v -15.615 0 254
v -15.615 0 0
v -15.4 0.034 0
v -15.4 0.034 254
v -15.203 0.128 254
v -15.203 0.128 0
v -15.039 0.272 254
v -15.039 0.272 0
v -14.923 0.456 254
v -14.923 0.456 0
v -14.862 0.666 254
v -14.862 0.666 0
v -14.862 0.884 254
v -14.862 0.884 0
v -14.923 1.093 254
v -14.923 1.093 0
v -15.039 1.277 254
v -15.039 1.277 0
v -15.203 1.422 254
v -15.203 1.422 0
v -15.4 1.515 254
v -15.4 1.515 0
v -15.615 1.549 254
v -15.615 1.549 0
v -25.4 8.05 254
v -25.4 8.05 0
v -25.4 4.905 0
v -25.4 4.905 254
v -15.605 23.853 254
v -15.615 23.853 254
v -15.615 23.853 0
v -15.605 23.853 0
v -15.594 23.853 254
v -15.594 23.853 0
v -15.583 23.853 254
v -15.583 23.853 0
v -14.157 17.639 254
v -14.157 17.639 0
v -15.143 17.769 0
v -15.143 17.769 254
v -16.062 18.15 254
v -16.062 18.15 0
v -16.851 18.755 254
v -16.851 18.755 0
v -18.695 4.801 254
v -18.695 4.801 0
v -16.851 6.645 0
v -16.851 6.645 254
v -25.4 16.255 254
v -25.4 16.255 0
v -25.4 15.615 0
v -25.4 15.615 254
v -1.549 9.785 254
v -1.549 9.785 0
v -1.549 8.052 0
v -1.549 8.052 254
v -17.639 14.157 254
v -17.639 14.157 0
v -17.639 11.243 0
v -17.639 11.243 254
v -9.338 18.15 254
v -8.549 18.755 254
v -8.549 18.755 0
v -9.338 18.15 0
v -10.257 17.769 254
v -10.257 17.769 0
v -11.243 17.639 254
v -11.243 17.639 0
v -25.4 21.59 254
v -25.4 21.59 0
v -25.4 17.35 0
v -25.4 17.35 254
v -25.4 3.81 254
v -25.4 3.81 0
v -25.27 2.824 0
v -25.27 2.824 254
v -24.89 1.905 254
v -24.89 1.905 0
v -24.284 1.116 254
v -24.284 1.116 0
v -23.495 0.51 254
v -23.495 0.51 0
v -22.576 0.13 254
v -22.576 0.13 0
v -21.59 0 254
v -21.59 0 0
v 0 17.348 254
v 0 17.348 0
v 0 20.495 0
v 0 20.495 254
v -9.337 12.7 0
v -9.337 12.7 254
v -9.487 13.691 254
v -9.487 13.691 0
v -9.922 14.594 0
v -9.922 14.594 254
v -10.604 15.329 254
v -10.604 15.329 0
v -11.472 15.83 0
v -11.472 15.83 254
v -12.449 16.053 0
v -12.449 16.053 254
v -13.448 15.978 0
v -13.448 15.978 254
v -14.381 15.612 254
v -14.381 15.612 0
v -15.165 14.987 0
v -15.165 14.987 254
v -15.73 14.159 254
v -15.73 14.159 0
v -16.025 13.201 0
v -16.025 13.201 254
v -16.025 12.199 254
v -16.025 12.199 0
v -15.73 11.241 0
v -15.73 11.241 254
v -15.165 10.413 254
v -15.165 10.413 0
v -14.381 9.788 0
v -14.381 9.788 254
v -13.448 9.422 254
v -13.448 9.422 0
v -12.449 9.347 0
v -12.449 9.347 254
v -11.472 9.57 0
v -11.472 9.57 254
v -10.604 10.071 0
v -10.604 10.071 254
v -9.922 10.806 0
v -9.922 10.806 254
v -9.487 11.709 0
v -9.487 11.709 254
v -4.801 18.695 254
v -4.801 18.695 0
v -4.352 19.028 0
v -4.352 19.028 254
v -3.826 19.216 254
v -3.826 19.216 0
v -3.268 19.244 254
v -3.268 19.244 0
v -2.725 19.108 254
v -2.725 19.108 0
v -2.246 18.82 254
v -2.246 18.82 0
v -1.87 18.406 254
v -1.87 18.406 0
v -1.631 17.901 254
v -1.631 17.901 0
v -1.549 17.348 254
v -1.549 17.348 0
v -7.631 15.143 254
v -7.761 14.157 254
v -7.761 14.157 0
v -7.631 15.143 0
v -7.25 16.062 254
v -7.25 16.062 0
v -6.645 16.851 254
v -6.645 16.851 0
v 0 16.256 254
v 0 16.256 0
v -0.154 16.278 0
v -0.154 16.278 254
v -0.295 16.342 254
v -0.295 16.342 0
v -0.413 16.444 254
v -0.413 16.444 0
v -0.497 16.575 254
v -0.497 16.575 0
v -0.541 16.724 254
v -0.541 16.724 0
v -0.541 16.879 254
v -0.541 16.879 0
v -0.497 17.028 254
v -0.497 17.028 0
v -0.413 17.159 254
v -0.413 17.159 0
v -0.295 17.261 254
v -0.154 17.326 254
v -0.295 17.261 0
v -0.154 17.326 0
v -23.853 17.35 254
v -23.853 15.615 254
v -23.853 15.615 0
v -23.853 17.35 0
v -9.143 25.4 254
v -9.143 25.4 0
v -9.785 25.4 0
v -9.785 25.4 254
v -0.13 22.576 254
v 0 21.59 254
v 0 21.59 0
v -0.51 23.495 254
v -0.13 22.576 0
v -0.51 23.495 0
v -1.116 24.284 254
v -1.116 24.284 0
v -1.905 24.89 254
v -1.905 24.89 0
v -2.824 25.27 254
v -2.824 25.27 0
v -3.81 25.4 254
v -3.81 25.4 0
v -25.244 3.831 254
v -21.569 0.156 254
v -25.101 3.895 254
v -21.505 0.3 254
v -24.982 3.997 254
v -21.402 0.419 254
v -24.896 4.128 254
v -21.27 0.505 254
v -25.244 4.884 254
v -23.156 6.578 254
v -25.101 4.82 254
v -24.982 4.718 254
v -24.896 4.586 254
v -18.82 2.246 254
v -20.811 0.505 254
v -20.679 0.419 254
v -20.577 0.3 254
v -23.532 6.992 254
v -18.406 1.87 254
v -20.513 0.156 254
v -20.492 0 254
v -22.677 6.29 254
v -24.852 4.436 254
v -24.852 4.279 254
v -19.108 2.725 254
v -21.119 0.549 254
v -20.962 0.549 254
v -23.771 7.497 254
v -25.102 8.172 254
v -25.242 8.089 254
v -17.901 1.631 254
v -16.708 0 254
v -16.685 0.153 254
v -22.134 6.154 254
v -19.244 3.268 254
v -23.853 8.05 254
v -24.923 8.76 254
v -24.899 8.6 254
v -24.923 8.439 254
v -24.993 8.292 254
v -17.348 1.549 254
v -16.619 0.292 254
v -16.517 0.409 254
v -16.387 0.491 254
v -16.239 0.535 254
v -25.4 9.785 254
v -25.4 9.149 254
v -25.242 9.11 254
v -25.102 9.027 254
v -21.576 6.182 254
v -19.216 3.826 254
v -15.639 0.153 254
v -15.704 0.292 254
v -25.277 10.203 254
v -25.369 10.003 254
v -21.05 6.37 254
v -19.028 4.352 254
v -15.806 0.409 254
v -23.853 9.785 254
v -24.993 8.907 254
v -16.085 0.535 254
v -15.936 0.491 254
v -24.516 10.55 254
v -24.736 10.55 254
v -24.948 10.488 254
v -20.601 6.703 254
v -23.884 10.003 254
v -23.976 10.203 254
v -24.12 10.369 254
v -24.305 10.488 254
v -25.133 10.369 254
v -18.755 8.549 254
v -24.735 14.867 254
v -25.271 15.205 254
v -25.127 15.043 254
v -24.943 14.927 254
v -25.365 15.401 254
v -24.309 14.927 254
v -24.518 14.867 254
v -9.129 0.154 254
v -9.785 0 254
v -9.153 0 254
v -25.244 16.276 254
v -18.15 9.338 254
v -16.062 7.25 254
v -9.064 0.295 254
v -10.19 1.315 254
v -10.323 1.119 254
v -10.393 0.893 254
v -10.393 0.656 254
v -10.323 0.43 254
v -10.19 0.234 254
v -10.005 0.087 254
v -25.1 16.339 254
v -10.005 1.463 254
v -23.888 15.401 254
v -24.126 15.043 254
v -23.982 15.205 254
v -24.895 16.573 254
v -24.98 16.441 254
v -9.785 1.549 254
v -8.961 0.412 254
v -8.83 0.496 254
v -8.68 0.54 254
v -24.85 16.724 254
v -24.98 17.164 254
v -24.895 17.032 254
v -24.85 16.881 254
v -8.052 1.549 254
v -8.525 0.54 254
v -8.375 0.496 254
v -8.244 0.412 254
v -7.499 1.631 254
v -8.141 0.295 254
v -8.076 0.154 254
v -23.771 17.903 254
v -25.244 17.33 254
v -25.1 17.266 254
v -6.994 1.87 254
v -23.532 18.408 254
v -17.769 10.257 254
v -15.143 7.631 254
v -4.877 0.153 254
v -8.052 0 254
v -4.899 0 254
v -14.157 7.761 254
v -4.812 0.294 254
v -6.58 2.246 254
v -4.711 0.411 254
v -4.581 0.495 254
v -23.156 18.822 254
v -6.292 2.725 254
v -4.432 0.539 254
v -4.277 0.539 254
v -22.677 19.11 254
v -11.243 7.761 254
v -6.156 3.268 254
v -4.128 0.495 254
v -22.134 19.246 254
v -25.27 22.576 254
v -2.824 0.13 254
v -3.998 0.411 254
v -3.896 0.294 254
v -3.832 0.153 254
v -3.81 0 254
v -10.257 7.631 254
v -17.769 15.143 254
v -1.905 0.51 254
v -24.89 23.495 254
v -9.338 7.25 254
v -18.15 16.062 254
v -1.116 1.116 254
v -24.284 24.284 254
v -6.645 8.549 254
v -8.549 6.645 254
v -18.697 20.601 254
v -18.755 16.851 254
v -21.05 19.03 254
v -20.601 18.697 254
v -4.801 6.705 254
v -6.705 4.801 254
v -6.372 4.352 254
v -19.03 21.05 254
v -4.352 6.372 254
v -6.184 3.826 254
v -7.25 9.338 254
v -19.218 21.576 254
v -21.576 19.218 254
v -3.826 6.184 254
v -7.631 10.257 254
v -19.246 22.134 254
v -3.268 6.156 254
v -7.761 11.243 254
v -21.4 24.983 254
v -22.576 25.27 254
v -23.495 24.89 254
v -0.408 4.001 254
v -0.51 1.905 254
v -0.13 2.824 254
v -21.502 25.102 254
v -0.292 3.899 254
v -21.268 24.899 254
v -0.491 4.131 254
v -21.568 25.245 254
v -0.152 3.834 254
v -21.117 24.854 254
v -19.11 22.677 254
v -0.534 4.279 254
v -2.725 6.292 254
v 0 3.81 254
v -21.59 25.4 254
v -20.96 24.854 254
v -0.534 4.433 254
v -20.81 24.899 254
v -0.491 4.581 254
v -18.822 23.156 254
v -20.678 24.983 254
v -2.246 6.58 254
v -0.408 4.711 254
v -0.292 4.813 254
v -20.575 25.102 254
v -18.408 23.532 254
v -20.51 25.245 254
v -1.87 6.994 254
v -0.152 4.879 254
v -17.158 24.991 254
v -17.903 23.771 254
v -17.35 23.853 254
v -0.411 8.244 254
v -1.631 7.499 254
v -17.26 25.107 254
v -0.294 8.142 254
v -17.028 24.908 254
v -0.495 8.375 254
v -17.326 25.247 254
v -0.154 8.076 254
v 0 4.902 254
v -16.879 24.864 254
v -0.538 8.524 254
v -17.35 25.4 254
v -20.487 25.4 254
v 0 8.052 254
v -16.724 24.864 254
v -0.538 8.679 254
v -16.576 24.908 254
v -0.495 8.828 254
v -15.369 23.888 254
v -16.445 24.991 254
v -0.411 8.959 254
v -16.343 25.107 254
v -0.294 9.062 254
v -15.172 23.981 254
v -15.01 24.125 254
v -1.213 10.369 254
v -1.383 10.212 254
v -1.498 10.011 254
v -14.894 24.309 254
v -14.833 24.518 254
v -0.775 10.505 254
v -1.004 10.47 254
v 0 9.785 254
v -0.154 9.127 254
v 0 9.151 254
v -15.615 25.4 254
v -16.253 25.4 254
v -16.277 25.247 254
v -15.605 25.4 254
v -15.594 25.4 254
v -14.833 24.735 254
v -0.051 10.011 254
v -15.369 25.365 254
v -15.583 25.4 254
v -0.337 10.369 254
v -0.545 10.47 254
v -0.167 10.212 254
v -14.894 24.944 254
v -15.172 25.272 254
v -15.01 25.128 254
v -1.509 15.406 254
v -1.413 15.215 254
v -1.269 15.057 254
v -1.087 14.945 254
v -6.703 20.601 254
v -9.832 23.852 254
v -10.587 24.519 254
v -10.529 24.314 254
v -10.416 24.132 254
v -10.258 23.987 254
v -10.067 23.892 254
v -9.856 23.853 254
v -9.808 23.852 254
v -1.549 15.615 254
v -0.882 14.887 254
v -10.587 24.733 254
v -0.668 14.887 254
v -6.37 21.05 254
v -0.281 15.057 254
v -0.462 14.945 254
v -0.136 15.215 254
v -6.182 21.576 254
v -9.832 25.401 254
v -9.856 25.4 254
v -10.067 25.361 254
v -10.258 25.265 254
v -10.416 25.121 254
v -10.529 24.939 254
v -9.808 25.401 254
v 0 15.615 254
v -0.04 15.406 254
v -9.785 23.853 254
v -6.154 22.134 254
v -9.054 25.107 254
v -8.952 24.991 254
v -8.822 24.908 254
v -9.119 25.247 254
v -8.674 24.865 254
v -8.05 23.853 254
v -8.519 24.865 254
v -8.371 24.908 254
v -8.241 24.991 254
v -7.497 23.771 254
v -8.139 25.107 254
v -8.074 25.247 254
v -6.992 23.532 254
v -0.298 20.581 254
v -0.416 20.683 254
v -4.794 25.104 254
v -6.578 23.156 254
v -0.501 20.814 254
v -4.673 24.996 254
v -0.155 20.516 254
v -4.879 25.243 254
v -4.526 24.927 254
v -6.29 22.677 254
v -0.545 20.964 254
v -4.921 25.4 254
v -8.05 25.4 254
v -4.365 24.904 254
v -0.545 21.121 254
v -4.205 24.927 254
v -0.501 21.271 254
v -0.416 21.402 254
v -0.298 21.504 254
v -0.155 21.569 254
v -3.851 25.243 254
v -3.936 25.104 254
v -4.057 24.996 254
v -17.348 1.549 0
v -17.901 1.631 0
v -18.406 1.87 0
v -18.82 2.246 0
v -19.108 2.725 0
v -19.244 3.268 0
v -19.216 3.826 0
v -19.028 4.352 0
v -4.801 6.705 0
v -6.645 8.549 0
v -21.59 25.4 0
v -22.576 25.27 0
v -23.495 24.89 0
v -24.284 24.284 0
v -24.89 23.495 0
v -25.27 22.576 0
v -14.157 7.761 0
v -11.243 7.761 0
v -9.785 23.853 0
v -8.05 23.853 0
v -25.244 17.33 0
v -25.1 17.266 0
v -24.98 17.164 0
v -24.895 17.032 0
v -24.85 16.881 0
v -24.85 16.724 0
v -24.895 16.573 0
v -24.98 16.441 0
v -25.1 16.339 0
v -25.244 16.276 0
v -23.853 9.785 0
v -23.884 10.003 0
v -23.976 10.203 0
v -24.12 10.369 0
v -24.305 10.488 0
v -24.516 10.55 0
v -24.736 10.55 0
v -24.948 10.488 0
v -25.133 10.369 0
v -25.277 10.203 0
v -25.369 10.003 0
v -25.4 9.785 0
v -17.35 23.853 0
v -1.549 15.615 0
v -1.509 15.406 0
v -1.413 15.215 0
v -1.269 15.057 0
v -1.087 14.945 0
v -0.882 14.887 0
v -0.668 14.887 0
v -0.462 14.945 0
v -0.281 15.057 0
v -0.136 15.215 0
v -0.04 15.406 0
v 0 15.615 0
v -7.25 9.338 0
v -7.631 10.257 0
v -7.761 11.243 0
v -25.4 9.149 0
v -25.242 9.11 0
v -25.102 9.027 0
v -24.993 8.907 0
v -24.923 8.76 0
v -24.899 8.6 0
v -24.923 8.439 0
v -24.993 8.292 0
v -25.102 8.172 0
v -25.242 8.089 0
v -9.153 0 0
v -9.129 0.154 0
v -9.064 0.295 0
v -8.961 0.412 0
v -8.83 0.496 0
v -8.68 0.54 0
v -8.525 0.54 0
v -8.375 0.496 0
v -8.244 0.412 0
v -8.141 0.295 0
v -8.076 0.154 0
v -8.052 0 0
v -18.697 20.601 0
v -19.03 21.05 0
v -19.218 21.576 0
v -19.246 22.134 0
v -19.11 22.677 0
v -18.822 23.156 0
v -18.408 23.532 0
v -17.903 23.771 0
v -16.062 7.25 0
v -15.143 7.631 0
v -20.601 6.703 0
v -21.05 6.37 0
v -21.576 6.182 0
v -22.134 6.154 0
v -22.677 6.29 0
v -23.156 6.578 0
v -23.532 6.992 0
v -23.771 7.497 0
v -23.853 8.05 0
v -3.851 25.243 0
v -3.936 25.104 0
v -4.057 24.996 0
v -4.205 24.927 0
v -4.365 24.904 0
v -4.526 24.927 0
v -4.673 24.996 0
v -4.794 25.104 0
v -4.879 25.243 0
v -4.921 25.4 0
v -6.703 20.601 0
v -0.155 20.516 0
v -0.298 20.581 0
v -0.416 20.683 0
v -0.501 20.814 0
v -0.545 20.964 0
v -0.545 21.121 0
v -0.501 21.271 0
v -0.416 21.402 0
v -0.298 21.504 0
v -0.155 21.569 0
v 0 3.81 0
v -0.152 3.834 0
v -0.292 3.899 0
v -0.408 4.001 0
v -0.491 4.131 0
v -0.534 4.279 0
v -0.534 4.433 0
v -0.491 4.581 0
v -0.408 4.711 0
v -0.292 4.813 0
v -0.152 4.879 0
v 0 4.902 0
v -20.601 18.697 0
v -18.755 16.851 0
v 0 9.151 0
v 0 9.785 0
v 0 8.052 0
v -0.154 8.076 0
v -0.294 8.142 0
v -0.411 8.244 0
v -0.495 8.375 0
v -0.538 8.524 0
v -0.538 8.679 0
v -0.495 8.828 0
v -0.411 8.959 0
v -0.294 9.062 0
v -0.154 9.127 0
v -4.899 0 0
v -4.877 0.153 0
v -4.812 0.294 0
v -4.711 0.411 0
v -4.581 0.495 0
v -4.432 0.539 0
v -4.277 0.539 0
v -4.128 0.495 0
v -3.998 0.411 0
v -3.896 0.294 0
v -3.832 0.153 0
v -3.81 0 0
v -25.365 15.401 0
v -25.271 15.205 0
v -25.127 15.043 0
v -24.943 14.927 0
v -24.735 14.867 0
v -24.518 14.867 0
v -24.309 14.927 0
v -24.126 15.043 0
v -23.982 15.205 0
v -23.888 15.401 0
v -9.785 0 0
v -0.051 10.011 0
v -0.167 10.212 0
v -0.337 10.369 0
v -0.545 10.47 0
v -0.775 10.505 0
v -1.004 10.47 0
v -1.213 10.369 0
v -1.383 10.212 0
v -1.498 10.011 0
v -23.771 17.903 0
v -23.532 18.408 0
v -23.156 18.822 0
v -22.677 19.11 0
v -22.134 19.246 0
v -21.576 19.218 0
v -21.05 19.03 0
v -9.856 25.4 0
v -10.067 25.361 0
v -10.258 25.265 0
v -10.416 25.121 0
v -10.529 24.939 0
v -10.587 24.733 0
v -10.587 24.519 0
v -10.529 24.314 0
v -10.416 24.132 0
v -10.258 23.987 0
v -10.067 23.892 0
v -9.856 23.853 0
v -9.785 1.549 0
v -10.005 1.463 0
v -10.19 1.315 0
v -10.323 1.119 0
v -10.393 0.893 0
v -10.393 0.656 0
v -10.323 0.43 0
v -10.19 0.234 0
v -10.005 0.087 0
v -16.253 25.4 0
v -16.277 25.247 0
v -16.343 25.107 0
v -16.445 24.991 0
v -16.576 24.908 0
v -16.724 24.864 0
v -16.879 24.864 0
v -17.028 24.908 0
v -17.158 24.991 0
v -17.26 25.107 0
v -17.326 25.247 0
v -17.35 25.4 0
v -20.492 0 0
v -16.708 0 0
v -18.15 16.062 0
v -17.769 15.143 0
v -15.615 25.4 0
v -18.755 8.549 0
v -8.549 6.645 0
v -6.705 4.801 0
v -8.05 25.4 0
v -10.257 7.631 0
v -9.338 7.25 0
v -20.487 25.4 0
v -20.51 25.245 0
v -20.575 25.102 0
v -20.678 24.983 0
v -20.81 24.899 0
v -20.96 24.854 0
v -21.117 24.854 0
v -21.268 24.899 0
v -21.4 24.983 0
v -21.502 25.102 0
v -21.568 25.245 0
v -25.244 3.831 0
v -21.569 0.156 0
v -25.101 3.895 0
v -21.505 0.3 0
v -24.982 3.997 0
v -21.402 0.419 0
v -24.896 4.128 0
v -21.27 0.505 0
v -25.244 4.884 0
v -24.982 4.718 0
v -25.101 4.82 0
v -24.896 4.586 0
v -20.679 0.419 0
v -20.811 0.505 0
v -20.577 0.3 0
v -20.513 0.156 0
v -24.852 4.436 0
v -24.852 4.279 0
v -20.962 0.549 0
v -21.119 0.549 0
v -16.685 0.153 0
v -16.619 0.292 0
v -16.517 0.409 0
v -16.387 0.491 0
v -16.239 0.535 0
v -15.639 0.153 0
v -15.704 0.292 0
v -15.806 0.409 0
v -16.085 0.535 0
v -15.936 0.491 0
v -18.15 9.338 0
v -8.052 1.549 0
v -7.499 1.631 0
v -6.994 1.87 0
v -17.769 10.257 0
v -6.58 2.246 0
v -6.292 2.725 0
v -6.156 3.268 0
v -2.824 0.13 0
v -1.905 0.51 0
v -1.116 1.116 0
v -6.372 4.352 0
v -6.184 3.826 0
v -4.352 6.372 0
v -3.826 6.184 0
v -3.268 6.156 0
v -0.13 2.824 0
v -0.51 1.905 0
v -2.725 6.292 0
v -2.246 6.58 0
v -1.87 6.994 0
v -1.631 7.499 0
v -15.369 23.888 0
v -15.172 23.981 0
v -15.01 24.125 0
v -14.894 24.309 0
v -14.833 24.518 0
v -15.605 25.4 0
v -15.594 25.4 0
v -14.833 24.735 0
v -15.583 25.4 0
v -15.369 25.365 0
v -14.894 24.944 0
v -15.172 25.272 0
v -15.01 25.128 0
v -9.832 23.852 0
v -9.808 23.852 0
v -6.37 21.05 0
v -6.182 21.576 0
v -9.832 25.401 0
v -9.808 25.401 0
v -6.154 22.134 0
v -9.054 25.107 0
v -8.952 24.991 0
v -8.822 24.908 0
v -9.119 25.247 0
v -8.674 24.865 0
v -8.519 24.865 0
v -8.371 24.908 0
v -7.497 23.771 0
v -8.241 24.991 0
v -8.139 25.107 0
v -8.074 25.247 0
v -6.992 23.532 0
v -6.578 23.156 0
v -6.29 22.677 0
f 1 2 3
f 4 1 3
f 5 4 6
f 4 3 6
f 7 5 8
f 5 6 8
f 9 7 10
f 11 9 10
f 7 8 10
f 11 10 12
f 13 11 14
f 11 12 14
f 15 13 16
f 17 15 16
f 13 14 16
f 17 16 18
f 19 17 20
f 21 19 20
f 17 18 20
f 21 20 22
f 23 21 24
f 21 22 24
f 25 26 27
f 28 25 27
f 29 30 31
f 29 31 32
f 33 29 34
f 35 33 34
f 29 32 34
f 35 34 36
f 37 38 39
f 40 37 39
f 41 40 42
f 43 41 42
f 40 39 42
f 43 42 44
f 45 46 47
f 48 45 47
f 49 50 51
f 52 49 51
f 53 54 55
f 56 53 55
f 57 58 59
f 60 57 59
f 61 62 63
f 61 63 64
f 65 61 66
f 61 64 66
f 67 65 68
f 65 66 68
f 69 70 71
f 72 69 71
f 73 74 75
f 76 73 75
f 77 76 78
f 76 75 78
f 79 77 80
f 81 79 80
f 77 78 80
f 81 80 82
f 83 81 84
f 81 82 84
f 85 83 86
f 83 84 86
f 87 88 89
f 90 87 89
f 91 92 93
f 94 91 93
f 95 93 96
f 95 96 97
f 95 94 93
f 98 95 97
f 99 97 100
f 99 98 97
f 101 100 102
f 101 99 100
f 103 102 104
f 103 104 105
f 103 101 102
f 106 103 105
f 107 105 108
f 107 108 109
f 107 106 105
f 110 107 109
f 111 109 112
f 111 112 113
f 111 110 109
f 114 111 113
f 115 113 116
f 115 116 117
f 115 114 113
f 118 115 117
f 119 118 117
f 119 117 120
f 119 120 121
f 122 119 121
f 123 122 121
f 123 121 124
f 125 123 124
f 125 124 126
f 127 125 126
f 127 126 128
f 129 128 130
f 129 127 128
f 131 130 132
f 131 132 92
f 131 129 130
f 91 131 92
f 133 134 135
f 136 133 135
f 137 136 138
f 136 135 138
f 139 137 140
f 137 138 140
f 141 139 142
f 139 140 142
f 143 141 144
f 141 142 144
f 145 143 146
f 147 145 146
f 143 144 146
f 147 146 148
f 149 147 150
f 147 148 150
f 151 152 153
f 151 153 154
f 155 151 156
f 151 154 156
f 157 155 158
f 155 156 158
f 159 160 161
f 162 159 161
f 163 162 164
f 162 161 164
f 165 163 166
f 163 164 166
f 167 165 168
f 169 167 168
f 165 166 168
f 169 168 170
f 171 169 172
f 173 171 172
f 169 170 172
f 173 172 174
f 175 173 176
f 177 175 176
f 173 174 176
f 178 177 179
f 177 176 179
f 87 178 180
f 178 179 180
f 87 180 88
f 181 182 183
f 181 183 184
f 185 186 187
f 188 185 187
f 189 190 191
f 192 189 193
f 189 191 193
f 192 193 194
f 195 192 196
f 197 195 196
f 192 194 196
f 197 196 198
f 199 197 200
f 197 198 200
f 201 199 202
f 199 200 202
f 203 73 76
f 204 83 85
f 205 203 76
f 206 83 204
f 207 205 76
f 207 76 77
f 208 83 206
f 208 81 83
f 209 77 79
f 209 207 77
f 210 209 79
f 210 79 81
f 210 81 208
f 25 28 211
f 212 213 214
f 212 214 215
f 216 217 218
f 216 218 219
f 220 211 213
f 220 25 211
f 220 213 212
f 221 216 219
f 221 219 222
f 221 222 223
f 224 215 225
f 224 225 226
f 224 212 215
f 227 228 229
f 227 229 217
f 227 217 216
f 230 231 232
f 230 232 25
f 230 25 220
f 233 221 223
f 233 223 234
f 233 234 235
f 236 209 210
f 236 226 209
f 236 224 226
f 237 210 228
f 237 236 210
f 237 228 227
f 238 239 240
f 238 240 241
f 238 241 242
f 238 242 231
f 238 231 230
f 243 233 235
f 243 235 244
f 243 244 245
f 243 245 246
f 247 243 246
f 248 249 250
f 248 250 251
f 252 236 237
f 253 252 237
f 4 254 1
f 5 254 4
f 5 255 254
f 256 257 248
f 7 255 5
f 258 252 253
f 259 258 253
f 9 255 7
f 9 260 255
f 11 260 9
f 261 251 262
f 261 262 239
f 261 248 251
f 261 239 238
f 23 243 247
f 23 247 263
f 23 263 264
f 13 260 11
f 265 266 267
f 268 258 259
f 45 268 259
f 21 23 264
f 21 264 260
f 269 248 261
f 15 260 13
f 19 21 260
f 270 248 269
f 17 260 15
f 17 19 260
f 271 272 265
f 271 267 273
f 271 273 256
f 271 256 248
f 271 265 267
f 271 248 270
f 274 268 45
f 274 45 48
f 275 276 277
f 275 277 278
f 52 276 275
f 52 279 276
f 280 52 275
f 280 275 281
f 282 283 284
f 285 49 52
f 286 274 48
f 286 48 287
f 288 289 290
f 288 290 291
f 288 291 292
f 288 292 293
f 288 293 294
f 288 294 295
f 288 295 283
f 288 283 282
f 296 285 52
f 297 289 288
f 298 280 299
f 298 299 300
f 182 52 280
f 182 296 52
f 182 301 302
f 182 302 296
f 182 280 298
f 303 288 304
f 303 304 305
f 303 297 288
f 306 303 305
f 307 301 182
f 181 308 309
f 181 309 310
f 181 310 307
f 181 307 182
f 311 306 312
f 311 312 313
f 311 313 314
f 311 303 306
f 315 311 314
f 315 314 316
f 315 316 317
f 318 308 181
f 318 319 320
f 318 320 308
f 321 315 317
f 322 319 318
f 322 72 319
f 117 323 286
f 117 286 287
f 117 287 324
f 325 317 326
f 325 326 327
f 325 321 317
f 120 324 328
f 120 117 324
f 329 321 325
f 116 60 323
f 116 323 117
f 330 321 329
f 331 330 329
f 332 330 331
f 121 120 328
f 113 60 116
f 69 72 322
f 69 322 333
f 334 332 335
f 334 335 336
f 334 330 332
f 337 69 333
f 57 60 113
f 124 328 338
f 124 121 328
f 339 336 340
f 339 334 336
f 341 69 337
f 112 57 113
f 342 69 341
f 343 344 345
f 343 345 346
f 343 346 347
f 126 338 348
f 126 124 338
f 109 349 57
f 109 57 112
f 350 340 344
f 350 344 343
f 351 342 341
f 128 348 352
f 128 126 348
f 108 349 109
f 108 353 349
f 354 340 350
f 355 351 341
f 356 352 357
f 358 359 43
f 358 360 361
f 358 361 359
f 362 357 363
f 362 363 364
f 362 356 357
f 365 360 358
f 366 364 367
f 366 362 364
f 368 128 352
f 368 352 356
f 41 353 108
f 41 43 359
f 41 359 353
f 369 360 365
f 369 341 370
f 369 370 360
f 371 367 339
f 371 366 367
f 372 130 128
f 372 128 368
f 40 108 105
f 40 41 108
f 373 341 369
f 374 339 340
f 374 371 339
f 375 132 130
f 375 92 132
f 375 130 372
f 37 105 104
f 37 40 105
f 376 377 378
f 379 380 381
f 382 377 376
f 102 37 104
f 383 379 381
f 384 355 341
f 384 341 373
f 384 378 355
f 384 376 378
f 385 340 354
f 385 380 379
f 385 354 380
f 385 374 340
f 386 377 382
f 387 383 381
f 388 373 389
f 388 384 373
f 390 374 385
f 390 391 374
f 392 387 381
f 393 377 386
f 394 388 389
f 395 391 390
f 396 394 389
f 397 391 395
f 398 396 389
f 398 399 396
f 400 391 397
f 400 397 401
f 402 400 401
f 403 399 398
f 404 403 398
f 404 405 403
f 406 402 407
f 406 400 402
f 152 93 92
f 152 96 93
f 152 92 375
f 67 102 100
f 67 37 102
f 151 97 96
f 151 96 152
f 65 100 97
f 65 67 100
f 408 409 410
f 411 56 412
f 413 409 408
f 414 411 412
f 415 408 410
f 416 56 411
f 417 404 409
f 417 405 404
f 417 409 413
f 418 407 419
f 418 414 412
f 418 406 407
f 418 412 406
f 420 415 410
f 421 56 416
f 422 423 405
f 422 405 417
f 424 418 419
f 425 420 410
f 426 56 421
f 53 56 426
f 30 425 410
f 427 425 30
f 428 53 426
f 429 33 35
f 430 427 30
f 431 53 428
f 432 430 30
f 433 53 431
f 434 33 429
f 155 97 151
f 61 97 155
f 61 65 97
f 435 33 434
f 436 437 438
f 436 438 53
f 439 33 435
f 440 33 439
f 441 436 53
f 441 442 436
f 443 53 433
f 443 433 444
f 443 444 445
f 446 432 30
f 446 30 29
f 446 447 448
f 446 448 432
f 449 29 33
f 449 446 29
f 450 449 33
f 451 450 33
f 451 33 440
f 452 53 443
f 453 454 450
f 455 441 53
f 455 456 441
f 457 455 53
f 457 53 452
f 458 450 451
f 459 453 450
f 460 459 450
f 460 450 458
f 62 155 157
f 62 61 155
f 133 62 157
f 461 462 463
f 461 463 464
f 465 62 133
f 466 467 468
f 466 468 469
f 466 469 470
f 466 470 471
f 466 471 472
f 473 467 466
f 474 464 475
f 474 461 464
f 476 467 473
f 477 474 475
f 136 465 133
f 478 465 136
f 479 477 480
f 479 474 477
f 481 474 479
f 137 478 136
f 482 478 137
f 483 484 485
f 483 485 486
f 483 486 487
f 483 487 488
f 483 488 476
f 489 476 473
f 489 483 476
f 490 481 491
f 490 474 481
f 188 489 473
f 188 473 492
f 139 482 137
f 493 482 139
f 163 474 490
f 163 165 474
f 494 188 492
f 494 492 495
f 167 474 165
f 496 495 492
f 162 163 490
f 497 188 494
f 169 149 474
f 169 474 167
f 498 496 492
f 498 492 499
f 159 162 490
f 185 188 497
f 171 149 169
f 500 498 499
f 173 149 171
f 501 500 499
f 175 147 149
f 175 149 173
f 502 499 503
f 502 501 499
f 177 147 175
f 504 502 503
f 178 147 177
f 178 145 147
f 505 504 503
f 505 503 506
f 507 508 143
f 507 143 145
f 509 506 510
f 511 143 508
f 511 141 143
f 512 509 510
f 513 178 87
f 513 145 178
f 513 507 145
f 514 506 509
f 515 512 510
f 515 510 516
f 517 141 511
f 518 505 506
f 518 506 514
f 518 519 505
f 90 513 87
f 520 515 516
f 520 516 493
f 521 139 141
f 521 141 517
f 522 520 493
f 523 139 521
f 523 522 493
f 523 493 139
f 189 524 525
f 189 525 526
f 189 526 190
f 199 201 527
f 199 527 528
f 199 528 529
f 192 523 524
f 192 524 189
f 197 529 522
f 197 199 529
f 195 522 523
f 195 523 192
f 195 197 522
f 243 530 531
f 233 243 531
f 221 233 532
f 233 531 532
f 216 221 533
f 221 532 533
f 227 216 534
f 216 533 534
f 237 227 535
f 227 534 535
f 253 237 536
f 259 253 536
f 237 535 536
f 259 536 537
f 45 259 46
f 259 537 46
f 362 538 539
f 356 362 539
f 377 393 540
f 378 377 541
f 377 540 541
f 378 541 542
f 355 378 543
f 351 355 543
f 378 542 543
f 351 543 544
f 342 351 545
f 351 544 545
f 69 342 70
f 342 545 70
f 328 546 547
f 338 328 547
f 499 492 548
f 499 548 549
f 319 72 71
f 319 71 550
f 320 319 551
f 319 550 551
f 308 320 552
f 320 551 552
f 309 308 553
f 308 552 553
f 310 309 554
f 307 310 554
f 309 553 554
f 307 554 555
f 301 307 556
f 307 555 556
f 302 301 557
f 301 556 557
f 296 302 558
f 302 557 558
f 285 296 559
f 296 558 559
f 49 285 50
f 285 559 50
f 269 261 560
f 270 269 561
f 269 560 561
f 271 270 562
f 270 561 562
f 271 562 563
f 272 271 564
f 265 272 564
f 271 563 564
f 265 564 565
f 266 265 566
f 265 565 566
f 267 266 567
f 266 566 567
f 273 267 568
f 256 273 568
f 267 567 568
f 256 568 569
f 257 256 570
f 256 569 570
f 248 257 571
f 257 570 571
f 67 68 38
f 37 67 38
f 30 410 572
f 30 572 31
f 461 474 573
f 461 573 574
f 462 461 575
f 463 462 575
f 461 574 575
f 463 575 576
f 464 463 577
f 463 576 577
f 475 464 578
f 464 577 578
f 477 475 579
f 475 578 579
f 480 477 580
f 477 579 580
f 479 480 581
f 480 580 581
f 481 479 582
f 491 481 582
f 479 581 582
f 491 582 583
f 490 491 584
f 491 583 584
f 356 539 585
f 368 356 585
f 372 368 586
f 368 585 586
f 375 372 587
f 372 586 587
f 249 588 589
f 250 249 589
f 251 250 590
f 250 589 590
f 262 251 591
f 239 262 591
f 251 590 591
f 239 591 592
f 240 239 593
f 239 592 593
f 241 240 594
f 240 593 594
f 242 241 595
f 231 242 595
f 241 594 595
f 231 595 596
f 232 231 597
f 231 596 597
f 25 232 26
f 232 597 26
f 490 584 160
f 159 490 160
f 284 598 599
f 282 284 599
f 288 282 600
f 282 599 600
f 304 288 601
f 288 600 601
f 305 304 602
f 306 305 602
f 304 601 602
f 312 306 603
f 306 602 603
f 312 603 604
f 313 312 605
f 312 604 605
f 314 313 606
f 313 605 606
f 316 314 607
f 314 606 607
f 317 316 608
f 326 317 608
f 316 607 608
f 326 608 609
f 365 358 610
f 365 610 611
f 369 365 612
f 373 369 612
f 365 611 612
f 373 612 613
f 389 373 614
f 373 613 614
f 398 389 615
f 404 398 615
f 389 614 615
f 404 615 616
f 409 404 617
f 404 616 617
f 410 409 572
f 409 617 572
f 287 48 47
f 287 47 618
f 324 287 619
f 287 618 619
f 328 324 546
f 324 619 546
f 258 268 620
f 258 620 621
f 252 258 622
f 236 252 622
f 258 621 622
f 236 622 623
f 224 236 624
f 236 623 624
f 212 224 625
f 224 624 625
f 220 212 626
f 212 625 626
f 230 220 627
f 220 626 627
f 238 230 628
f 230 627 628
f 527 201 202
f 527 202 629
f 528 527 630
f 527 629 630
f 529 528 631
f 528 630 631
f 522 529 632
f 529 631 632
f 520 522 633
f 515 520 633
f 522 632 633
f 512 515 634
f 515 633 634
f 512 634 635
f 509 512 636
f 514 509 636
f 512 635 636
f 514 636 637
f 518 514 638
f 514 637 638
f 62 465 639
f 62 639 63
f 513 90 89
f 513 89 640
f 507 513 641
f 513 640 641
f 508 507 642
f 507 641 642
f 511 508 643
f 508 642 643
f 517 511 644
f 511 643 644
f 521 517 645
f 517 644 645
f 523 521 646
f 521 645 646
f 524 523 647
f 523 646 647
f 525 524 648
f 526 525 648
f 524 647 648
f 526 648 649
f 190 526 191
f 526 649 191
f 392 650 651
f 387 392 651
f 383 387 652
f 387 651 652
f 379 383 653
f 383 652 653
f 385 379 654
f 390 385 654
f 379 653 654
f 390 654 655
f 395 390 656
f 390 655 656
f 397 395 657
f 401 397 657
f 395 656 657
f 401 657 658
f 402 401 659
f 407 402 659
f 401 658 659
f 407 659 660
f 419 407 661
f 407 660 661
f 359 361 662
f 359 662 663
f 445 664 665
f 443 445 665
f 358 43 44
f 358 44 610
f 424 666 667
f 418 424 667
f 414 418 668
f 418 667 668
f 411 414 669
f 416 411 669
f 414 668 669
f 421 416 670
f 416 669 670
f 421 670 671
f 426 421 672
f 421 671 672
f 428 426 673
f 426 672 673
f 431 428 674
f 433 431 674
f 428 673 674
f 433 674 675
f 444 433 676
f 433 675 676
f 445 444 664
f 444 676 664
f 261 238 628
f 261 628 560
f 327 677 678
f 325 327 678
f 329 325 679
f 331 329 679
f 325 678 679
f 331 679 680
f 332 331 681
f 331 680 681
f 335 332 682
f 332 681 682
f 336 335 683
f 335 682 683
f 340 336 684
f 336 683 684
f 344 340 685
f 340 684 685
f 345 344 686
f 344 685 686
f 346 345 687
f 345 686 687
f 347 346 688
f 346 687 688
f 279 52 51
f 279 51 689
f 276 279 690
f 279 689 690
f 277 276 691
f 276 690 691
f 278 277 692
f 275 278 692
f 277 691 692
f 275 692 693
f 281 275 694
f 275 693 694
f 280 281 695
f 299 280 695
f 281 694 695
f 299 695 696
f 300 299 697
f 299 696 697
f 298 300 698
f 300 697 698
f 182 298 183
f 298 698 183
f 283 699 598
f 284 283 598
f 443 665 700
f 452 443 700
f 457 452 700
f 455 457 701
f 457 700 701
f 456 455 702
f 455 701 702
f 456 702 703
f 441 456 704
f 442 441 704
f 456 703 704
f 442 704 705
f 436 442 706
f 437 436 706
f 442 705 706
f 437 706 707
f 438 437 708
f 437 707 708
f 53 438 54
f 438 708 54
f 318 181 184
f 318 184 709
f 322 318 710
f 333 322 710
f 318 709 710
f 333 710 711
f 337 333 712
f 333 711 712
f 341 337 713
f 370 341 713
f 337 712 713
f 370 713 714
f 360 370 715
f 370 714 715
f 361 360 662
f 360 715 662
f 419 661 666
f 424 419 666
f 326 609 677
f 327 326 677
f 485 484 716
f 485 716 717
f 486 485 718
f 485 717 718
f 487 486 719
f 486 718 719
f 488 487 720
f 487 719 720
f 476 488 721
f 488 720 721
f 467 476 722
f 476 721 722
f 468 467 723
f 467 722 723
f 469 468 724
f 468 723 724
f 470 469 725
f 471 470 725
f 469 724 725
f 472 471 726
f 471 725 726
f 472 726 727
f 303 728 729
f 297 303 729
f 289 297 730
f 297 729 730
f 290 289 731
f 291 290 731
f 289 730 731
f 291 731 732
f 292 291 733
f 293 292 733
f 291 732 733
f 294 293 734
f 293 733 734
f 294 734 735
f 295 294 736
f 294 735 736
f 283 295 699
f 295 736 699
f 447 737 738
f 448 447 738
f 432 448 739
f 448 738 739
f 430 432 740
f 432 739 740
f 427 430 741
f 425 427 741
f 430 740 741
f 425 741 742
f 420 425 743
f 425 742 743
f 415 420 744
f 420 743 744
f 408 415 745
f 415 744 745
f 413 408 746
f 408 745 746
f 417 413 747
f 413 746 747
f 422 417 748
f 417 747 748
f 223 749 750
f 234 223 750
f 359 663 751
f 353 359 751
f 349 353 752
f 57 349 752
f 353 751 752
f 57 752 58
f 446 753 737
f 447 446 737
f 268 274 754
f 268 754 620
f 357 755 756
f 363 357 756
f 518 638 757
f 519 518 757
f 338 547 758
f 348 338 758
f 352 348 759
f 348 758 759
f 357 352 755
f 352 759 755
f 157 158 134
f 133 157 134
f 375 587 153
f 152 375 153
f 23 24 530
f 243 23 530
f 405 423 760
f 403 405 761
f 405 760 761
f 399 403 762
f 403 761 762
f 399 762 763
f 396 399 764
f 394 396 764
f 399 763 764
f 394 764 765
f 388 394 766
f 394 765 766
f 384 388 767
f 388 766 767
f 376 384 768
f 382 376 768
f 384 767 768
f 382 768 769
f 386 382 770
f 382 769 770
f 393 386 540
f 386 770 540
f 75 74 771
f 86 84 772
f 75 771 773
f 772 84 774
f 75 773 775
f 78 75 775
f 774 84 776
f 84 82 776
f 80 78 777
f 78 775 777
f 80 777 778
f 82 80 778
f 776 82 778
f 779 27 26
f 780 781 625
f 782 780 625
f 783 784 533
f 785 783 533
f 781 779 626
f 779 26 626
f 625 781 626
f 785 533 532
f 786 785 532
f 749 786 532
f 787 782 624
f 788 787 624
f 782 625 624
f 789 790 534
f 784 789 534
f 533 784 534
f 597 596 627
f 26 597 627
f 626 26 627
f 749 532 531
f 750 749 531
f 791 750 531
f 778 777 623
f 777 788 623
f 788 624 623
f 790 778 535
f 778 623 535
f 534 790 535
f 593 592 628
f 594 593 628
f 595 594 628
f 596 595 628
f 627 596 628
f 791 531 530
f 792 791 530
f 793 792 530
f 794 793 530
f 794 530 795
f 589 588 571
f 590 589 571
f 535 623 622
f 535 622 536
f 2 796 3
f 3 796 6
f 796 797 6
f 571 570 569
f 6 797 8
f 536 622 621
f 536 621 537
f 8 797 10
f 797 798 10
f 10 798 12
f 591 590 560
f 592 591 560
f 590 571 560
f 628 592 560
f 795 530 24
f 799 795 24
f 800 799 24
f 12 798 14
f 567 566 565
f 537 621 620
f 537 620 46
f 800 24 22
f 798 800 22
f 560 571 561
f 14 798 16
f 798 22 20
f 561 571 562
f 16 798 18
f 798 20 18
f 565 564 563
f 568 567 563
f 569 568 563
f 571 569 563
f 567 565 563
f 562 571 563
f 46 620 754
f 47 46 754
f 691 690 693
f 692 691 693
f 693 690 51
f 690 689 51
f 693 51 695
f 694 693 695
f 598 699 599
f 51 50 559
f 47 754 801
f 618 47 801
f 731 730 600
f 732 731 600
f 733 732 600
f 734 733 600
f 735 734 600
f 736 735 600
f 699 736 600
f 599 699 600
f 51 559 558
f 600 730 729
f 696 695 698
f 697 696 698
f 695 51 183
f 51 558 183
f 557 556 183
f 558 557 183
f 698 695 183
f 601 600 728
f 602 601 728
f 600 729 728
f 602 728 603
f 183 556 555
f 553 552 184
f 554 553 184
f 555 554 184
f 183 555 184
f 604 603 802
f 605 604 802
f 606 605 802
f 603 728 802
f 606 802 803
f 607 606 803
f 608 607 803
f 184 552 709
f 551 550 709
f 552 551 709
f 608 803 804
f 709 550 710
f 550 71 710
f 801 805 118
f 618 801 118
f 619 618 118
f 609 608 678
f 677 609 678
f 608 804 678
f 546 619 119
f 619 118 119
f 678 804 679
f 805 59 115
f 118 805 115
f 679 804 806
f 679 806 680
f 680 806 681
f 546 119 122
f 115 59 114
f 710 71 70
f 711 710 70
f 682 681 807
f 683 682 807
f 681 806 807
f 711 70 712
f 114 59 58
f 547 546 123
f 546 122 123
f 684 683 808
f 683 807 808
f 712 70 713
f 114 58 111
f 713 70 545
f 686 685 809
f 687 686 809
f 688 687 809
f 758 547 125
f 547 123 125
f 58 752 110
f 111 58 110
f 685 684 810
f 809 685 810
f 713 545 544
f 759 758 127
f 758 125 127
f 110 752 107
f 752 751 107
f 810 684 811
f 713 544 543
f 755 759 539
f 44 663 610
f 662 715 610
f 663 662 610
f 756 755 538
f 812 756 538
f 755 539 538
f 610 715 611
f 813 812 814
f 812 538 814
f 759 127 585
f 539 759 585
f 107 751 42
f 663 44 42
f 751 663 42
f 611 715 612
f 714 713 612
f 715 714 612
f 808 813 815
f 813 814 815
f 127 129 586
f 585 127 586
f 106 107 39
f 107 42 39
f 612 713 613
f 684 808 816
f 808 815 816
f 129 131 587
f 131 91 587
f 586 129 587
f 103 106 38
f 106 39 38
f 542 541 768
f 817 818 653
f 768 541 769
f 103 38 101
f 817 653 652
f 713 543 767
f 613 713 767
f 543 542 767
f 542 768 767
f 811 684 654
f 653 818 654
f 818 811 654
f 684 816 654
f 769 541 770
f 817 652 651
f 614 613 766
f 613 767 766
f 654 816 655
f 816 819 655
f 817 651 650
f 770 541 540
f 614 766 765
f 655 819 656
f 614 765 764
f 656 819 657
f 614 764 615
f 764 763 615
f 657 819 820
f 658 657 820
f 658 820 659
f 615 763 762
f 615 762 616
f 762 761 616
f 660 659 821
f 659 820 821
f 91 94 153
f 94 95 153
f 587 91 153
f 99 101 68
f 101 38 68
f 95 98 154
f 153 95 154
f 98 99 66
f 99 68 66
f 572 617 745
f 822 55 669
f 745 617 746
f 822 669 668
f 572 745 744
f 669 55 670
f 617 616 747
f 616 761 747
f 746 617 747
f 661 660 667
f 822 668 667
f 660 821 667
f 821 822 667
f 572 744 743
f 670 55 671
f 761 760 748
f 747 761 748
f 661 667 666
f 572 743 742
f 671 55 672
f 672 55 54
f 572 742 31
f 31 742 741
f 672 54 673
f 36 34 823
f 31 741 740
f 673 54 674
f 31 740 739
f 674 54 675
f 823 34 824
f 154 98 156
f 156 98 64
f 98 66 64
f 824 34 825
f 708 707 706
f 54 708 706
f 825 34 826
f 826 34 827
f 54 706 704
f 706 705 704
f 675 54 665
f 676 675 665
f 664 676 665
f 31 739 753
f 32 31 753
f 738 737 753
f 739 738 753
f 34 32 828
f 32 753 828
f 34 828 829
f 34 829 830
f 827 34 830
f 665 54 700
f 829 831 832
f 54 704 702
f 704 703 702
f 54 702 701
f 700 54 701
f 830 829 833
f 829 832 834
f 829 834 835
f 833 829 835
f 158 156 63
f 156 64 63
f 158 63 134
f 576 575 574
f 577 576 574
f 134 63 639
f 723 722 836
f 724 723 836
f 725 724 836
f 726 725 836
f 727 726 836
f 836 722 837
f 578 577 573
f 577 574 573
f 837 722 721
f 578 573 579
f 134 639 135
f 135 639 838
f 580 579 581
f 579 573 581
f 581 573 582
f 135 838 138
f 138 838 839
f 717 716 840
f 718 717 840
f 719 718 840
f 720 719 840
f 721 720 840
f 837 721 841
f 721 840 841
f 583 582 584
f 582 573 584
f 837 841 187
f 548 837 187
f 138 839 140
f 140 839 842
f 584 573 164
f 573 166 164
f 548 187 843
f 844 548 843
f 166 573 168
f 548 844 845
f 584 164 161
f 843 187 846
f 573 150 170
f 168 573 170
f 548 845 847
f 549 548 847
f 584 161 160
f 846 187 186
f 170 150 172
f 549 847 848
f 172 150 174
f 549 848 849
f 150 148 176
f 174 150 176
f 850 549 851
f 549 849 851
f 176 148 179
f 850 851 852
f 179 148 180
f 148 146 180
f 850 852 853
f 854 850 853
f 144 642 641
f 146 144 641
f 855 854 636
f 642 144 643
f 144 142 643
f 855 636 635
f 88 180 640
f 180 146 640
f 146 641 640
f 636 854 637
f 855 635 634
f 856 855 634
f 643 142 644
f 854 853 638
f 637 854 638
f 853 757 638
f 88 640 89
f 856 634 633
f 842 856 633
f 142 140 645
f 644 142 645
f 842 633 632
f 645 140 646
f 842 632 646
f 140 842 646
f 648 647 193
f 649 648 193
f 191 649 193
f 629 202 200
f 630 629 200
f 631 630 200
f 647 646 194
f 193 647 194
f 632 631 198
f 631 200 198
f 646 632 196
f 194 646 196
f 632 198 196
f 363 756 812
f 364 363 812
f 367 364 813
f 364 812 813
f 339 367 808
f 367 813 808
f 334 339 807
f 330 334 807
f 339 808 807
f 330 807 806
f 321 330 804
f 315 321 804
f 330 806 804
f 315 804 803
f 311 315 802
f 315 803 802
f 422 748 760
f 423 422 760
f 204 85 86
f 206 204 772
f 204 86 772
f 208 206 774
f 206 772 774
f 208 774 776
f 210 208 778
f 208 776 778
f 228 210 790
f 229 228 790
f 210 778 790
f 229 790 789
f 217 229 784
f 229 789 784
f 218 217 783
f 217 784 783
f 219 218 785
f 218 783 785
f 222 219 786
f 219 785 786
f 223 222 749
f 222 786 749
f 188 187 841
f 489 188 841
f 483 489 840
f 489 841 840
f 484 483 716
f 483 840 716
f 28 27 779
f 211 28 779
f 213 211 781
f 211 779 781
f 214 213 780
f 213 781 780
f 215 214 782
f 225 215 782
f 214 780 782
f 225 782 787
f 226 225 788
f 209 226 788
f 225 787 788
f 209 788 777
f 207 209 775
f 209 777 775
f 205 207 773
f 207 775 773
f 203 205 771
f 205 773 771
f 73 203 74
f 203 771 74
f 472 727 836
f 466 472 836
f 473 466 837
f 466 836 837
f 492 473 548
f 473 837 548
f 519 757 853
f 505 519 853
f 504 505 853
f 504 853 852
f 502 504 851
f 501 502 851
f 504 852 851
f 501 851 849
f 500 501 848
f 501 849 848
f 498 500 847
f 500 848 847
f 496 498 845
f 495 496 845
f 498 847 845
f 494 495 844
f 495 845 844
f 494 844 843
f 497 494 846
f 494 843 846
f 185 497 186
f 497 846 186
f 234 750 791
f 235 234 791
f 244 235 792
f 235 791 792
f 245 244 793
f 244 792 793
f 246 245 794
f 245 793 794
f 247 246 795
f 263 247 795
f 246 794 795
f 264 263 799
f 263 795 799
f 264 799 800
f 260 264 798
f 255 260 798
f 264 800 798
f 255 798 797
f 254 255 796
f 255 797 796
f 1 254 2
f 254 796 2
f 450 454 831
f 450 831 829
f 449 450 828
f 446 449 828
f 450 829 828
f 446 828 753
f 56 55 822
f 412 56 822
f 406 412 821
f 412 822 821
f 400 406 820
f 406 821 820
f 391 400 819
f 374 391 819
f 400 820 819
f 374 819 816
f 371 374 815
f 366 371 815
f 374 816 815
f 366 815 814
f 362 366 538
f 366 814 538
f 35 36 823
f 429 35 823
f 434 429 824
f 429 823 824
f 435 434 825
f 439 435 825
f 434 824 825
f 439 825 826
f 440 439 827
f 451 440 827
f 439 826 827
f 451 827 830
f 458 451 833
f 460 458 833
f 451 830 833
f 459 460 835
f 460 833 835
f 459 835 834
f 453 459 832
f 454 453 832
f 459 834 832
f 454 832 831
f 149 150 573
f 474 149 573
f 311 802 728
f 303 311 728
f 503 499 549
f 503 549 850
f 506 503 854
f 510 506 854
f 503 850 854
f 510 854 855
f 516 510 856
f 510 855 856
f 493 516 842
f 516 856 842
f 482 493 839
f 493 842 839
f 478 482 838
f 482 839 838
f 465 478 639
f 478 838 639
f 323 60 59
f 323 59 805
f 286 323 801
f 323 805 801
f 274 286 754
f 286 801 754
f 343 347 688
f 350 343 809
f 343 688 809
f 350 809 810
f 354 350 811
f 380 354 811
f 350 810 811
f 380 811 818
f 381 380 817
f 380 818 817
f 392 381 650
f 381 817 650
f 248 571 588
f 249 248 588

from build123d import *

# Parameters (mm, degrees)
F0_R     = 3.362501
F1_DEPTH = 254


with BuildPart() as f1:
    # F0 (on Top) → F1 (new body)
    with BuildSketch(Plane.XY):
        with BuildLine():
            ThreePointArc((-8.548576, 18.755238), (-9.784629, 17.929334), (-11.242653, 17.639315))
            Line((-11.242653, 17.639315), (-14.157347, 17.639315))
            ThreePointArc((-14.157347, 17.639315), (-15.615371, 17.929334), (-16.851424, 18.755238))
            Line((-16.851424, 18.755238), (-18.696905, 20.600719))
            ThreePointArc((-18.696905, 20.600719), (-19.109857, 22.67677), (-17.349867, 23.852758))
            Line((-17.349867, 23.852758), (-15.615371, 23.852758))
            Line((-15.615371, 23.852758), (-15.58302, 23.852758))
            ThreePointArc((-15.58302, 23.852758), (-14.825405, 24.626379), (-15.58302, 25.4))
            Line((-15.58302, 25.4), (-15.615371, 25.4))
            Line((-15.615371, 25.4), (-16.253341, 25.4))
            ThreePointArc((-16.253341, 25.4), (-16.801604, 24.858772), (-17.349867, 25.4))
            Line((-17.349867, 25.4), (-20.487482, 25.4))
            ThreePointArc((-20.487482, 25.4), (-21.038741, 24.848741), (-21.59, 25.4))
            ThreePointArc((-21.59, 25.4), (-24.284077, 24.284077), (-25.4, 21.59))
            Line((-25.4, 21.59), (-25.4, 20.504724))
            Line((-25.4, 20.504724), (-25.4, 17.349867))
            ThreePointArc((-25.4, 17.349867), (-24.844161, 16.802675), (-25.4, 16.255483))
            Line((-25.4, 16.255483), (-25.4, 15.615371))
            ThreePointArc((-25.4, 15.615371), (-24.626379, 14.859554), (-23.852758, 15.615371))
            Line((-23.852758, 15.615371), (-23.852758, 17.349867))
            ThreePointArc((-23.852758, 17.349867), (-22.67677, 19.109857), (-20.600719, 18.696905))
            Line((-20.600719, 18.696905), (-18.755238, 16.851424))
            ThreePointArc((-18.755238, 16.851424), (-17.929334, 15.615371), (-17.639315, 14.157347))
            Line((-17.639315, 14.157347), (-17.639315, 11.242653))
            ThreePointArc((-17.639315, 11.242653), (-17.929334, 9.784629), (-18.755238, 8.548576))
            Line((-18.755238, 8.548576), (-20.600719, 6.703095))
            ThreePointArc((-20.600719, 6.703095), (-22.67677, 6.290143), (-23.852758, 8.050133))
            Line((-23.852758, 8.050133), (-23.852758, 9.784629))
            ThreePointArc((-23.852758, 9.784629), (-24.626379, 10.55825), (-25.4, 9.784629))
            Line((-25.4, 9.784629), (-25.4, 9.149239))
            ThreePointArc((-25.4, 9.149239), (-24.899374, 8.599686), (-25.4, 8.050133))
            Line((-25.4, 8.050133), (-25.4, 4.904538))
            ThreePointArc((-25.4, 4.904538), (-24.846216, 4.357269), (-25.4, 3.81))
            ThreePointArc((-25.4, 3.81), (-24.284077, 1.115923), (-21.59, 0))
            ThreePointArc((-21.59, 0), (-21.040817, 0.554885), (-20.491634, 0))
            Line((-20.491634, 0), (-16.708169, 0))
            ThreePointArc((-16.708169, 0), (-16.16177, 0.540135), (-15.615371, 0))
            ThreePointArc((-15.615371, 0), (-14.854184, 0.7747), (-15.615371, 1.5494))
            Line((-15.615371, 1.5494), (-17.347709, 1.5494))
            ThreePointArc((-17.347709, 1.5494), (-19.107699, 2.725388), (-18.694747, 4.801438))
            Line((-18.694747, 4.801438), (-16.851424, 6.644762))
            ThreePointArc((-16.851424, 6.644762), (-15.615371, 7.470666), (-14.157347, 7.760685))
            Line((-14.157347, 7.760685), (-11.242653, 7.760685))
            ThreePointArc((-11.242653, 7.760685), (-9.784629, 7.470666), (-8.548576, 6.644762))
            Line((-8.548576, 6.644762), (-6.705253, 4.801438))
            ThreePointArc((-6.705253, 4.801438), (-6.292301, 2.725388), (-8.052291, 1.5494))
            Line((-8.052291, 1.5494), (-9.784629, 1.5494))
            ThreePointArc((-9.784629, 1.5494), (-10.401836, 0.7747), (-9.784629, 0))
            Line((-9.784629, 0), (-9.152868, 0))
            ThreePointArc((-9.152868, 0), (-8.602579, 0.545262), (-8.052291, 0))
            Line((-8.052291, 0), (-4.898866, 0))
            ThreePointArc((-4.898866, 0), (-4.354433, 0.544433), (-3.81, 0))
            ThreePointArc((-3.81, 0), (-1.115923, 1.115923), (0, 3.81))
            ThreePointArc((0, 3.81), (-0.53938, 4.3561), (0, 4.9022))
            Line((0, 4.9022), (0, 8.052291))
            ThreePointArc((0, 8.052291), (-0.543517, 8.60166), (0, 9.151029))
            Line((0, 9.151029), (0, 9.784629))
            ThreePointArc((0, 9.784629), (-0.7747, 10.504691), (-1.5494, 9.784629))
            Line((-1.5494, 9.784629), (-1.5494, 8.052291))
            ThreePointArc((-1.5494, 8.052291), (-2.725388, 6.292301), (-4.801438, 6.705253))
            Line((-4.801438, 6.705253), (-6.644762, 8.548576))
            ThreePointArc((-6.644762, 8.548576), (-7.470666, 9.784629), (-7.760685, 11.242653))
            Line((-7.760685, 11.242653), (-7.760685, 14.157347))
            ThreePointArc((-7.760685, 14.157347), (-7.470666, 15.615371), (-6.644762, 16.851424))
            Line((-6.644762, 16.851424), (-4.801438, 18.694747))
            ThreePointArc((-4.801438, 18.694747), (-2.725388, 19.107699), (-1.5494, 17.347709))
            Line((-1.5494, 17.347709), (-1.5494, 15.615371))
            ThreePointArc((-1.5494, 15.615371), (-0.7747, 14.879405), (0, 15.615371))
            Line((0, 15.615371), (0, 16.255509))
            ThreePointArc((0, 16.255509), (-0.5461, 16.801609), (0, 17.347709))
            Line((0, 17.347709), (0, 20.495165))
            ThreePointArc((0, 20.495165), (-0.551056, 21.042583), (0, 21.59))
            ThreePointArc((0, 21.59), (-1.115923, 24.284077), (-3.81, 25.4))
            ThreePointArc((-3.81, 25.4), (-4.365303, 24.903619), (-4.920606, 25.4))
            Line((-4.920606, 25.4), (-8.050133, 25.4))
            ThreePointArc((-8.050133, 25.4), (-8.596365, 24.859433), (-9.142596, 25.4))
            Line((-9.142596, 25.4), (-9.784629, 25.4))
            Line((-9.784629, 25.4), (-9.856203, 25.4))
            ThreePointArc((-9.856203, 25.4), (-10.594864, 24.626379), (-9.856203, 23.852758))
            Line((-9.856203, 23.852758), (-9.784629, 23.852758))
            Line((-9.784629, 23.852758), (-8.050133, 23.852758))
            ThreePointArc((-8.050133, 23.852758), (-6.290143, 22.67677), (-6.703095, 20.600719))
            Line((-6.703095, 20.600719), (-8.548576, 18.755238))
        make_face()
        with Locations((-12.7, 12.7)):
            Circle(F0_R, mode=Mode.SUBTRACT)
        with BuildLine():
            ThreePointArc((-9.856203, 23.852758), (-9.820416, 23.851931), (-9.784629, 23.852758))
            Line((-9.784629, 23.852758), (-9.856203, 23.852758))
        make_face()
        with BuildLine():
            Line((-15.58302, 23.852758), (-15.615371, 23.852758))
            ThreePointArc((-15.615371, 23.852758), (-15.599195, 23.852589), (-15.58302, 23.852758))
        make_face()
        with BuildLine():
            ThreePointArc((-9.784629, 25.4), (-9.820416, 25.400827), (-9.856203, 25.4))
            Line((-9.856203, 25.4), (-9.784629, 25.4))
        make_face()
        with BuildLine():
            Line((-15.615371, 25.4), (-15.58302, 25.4))
            ThreePointArc((-15.58302, 25.4), (-15.599195, 25.400169), (-15.615371, 25.4))
        make_face()
    extrude(amount=F1_DEPTH)


solid = f1.part
